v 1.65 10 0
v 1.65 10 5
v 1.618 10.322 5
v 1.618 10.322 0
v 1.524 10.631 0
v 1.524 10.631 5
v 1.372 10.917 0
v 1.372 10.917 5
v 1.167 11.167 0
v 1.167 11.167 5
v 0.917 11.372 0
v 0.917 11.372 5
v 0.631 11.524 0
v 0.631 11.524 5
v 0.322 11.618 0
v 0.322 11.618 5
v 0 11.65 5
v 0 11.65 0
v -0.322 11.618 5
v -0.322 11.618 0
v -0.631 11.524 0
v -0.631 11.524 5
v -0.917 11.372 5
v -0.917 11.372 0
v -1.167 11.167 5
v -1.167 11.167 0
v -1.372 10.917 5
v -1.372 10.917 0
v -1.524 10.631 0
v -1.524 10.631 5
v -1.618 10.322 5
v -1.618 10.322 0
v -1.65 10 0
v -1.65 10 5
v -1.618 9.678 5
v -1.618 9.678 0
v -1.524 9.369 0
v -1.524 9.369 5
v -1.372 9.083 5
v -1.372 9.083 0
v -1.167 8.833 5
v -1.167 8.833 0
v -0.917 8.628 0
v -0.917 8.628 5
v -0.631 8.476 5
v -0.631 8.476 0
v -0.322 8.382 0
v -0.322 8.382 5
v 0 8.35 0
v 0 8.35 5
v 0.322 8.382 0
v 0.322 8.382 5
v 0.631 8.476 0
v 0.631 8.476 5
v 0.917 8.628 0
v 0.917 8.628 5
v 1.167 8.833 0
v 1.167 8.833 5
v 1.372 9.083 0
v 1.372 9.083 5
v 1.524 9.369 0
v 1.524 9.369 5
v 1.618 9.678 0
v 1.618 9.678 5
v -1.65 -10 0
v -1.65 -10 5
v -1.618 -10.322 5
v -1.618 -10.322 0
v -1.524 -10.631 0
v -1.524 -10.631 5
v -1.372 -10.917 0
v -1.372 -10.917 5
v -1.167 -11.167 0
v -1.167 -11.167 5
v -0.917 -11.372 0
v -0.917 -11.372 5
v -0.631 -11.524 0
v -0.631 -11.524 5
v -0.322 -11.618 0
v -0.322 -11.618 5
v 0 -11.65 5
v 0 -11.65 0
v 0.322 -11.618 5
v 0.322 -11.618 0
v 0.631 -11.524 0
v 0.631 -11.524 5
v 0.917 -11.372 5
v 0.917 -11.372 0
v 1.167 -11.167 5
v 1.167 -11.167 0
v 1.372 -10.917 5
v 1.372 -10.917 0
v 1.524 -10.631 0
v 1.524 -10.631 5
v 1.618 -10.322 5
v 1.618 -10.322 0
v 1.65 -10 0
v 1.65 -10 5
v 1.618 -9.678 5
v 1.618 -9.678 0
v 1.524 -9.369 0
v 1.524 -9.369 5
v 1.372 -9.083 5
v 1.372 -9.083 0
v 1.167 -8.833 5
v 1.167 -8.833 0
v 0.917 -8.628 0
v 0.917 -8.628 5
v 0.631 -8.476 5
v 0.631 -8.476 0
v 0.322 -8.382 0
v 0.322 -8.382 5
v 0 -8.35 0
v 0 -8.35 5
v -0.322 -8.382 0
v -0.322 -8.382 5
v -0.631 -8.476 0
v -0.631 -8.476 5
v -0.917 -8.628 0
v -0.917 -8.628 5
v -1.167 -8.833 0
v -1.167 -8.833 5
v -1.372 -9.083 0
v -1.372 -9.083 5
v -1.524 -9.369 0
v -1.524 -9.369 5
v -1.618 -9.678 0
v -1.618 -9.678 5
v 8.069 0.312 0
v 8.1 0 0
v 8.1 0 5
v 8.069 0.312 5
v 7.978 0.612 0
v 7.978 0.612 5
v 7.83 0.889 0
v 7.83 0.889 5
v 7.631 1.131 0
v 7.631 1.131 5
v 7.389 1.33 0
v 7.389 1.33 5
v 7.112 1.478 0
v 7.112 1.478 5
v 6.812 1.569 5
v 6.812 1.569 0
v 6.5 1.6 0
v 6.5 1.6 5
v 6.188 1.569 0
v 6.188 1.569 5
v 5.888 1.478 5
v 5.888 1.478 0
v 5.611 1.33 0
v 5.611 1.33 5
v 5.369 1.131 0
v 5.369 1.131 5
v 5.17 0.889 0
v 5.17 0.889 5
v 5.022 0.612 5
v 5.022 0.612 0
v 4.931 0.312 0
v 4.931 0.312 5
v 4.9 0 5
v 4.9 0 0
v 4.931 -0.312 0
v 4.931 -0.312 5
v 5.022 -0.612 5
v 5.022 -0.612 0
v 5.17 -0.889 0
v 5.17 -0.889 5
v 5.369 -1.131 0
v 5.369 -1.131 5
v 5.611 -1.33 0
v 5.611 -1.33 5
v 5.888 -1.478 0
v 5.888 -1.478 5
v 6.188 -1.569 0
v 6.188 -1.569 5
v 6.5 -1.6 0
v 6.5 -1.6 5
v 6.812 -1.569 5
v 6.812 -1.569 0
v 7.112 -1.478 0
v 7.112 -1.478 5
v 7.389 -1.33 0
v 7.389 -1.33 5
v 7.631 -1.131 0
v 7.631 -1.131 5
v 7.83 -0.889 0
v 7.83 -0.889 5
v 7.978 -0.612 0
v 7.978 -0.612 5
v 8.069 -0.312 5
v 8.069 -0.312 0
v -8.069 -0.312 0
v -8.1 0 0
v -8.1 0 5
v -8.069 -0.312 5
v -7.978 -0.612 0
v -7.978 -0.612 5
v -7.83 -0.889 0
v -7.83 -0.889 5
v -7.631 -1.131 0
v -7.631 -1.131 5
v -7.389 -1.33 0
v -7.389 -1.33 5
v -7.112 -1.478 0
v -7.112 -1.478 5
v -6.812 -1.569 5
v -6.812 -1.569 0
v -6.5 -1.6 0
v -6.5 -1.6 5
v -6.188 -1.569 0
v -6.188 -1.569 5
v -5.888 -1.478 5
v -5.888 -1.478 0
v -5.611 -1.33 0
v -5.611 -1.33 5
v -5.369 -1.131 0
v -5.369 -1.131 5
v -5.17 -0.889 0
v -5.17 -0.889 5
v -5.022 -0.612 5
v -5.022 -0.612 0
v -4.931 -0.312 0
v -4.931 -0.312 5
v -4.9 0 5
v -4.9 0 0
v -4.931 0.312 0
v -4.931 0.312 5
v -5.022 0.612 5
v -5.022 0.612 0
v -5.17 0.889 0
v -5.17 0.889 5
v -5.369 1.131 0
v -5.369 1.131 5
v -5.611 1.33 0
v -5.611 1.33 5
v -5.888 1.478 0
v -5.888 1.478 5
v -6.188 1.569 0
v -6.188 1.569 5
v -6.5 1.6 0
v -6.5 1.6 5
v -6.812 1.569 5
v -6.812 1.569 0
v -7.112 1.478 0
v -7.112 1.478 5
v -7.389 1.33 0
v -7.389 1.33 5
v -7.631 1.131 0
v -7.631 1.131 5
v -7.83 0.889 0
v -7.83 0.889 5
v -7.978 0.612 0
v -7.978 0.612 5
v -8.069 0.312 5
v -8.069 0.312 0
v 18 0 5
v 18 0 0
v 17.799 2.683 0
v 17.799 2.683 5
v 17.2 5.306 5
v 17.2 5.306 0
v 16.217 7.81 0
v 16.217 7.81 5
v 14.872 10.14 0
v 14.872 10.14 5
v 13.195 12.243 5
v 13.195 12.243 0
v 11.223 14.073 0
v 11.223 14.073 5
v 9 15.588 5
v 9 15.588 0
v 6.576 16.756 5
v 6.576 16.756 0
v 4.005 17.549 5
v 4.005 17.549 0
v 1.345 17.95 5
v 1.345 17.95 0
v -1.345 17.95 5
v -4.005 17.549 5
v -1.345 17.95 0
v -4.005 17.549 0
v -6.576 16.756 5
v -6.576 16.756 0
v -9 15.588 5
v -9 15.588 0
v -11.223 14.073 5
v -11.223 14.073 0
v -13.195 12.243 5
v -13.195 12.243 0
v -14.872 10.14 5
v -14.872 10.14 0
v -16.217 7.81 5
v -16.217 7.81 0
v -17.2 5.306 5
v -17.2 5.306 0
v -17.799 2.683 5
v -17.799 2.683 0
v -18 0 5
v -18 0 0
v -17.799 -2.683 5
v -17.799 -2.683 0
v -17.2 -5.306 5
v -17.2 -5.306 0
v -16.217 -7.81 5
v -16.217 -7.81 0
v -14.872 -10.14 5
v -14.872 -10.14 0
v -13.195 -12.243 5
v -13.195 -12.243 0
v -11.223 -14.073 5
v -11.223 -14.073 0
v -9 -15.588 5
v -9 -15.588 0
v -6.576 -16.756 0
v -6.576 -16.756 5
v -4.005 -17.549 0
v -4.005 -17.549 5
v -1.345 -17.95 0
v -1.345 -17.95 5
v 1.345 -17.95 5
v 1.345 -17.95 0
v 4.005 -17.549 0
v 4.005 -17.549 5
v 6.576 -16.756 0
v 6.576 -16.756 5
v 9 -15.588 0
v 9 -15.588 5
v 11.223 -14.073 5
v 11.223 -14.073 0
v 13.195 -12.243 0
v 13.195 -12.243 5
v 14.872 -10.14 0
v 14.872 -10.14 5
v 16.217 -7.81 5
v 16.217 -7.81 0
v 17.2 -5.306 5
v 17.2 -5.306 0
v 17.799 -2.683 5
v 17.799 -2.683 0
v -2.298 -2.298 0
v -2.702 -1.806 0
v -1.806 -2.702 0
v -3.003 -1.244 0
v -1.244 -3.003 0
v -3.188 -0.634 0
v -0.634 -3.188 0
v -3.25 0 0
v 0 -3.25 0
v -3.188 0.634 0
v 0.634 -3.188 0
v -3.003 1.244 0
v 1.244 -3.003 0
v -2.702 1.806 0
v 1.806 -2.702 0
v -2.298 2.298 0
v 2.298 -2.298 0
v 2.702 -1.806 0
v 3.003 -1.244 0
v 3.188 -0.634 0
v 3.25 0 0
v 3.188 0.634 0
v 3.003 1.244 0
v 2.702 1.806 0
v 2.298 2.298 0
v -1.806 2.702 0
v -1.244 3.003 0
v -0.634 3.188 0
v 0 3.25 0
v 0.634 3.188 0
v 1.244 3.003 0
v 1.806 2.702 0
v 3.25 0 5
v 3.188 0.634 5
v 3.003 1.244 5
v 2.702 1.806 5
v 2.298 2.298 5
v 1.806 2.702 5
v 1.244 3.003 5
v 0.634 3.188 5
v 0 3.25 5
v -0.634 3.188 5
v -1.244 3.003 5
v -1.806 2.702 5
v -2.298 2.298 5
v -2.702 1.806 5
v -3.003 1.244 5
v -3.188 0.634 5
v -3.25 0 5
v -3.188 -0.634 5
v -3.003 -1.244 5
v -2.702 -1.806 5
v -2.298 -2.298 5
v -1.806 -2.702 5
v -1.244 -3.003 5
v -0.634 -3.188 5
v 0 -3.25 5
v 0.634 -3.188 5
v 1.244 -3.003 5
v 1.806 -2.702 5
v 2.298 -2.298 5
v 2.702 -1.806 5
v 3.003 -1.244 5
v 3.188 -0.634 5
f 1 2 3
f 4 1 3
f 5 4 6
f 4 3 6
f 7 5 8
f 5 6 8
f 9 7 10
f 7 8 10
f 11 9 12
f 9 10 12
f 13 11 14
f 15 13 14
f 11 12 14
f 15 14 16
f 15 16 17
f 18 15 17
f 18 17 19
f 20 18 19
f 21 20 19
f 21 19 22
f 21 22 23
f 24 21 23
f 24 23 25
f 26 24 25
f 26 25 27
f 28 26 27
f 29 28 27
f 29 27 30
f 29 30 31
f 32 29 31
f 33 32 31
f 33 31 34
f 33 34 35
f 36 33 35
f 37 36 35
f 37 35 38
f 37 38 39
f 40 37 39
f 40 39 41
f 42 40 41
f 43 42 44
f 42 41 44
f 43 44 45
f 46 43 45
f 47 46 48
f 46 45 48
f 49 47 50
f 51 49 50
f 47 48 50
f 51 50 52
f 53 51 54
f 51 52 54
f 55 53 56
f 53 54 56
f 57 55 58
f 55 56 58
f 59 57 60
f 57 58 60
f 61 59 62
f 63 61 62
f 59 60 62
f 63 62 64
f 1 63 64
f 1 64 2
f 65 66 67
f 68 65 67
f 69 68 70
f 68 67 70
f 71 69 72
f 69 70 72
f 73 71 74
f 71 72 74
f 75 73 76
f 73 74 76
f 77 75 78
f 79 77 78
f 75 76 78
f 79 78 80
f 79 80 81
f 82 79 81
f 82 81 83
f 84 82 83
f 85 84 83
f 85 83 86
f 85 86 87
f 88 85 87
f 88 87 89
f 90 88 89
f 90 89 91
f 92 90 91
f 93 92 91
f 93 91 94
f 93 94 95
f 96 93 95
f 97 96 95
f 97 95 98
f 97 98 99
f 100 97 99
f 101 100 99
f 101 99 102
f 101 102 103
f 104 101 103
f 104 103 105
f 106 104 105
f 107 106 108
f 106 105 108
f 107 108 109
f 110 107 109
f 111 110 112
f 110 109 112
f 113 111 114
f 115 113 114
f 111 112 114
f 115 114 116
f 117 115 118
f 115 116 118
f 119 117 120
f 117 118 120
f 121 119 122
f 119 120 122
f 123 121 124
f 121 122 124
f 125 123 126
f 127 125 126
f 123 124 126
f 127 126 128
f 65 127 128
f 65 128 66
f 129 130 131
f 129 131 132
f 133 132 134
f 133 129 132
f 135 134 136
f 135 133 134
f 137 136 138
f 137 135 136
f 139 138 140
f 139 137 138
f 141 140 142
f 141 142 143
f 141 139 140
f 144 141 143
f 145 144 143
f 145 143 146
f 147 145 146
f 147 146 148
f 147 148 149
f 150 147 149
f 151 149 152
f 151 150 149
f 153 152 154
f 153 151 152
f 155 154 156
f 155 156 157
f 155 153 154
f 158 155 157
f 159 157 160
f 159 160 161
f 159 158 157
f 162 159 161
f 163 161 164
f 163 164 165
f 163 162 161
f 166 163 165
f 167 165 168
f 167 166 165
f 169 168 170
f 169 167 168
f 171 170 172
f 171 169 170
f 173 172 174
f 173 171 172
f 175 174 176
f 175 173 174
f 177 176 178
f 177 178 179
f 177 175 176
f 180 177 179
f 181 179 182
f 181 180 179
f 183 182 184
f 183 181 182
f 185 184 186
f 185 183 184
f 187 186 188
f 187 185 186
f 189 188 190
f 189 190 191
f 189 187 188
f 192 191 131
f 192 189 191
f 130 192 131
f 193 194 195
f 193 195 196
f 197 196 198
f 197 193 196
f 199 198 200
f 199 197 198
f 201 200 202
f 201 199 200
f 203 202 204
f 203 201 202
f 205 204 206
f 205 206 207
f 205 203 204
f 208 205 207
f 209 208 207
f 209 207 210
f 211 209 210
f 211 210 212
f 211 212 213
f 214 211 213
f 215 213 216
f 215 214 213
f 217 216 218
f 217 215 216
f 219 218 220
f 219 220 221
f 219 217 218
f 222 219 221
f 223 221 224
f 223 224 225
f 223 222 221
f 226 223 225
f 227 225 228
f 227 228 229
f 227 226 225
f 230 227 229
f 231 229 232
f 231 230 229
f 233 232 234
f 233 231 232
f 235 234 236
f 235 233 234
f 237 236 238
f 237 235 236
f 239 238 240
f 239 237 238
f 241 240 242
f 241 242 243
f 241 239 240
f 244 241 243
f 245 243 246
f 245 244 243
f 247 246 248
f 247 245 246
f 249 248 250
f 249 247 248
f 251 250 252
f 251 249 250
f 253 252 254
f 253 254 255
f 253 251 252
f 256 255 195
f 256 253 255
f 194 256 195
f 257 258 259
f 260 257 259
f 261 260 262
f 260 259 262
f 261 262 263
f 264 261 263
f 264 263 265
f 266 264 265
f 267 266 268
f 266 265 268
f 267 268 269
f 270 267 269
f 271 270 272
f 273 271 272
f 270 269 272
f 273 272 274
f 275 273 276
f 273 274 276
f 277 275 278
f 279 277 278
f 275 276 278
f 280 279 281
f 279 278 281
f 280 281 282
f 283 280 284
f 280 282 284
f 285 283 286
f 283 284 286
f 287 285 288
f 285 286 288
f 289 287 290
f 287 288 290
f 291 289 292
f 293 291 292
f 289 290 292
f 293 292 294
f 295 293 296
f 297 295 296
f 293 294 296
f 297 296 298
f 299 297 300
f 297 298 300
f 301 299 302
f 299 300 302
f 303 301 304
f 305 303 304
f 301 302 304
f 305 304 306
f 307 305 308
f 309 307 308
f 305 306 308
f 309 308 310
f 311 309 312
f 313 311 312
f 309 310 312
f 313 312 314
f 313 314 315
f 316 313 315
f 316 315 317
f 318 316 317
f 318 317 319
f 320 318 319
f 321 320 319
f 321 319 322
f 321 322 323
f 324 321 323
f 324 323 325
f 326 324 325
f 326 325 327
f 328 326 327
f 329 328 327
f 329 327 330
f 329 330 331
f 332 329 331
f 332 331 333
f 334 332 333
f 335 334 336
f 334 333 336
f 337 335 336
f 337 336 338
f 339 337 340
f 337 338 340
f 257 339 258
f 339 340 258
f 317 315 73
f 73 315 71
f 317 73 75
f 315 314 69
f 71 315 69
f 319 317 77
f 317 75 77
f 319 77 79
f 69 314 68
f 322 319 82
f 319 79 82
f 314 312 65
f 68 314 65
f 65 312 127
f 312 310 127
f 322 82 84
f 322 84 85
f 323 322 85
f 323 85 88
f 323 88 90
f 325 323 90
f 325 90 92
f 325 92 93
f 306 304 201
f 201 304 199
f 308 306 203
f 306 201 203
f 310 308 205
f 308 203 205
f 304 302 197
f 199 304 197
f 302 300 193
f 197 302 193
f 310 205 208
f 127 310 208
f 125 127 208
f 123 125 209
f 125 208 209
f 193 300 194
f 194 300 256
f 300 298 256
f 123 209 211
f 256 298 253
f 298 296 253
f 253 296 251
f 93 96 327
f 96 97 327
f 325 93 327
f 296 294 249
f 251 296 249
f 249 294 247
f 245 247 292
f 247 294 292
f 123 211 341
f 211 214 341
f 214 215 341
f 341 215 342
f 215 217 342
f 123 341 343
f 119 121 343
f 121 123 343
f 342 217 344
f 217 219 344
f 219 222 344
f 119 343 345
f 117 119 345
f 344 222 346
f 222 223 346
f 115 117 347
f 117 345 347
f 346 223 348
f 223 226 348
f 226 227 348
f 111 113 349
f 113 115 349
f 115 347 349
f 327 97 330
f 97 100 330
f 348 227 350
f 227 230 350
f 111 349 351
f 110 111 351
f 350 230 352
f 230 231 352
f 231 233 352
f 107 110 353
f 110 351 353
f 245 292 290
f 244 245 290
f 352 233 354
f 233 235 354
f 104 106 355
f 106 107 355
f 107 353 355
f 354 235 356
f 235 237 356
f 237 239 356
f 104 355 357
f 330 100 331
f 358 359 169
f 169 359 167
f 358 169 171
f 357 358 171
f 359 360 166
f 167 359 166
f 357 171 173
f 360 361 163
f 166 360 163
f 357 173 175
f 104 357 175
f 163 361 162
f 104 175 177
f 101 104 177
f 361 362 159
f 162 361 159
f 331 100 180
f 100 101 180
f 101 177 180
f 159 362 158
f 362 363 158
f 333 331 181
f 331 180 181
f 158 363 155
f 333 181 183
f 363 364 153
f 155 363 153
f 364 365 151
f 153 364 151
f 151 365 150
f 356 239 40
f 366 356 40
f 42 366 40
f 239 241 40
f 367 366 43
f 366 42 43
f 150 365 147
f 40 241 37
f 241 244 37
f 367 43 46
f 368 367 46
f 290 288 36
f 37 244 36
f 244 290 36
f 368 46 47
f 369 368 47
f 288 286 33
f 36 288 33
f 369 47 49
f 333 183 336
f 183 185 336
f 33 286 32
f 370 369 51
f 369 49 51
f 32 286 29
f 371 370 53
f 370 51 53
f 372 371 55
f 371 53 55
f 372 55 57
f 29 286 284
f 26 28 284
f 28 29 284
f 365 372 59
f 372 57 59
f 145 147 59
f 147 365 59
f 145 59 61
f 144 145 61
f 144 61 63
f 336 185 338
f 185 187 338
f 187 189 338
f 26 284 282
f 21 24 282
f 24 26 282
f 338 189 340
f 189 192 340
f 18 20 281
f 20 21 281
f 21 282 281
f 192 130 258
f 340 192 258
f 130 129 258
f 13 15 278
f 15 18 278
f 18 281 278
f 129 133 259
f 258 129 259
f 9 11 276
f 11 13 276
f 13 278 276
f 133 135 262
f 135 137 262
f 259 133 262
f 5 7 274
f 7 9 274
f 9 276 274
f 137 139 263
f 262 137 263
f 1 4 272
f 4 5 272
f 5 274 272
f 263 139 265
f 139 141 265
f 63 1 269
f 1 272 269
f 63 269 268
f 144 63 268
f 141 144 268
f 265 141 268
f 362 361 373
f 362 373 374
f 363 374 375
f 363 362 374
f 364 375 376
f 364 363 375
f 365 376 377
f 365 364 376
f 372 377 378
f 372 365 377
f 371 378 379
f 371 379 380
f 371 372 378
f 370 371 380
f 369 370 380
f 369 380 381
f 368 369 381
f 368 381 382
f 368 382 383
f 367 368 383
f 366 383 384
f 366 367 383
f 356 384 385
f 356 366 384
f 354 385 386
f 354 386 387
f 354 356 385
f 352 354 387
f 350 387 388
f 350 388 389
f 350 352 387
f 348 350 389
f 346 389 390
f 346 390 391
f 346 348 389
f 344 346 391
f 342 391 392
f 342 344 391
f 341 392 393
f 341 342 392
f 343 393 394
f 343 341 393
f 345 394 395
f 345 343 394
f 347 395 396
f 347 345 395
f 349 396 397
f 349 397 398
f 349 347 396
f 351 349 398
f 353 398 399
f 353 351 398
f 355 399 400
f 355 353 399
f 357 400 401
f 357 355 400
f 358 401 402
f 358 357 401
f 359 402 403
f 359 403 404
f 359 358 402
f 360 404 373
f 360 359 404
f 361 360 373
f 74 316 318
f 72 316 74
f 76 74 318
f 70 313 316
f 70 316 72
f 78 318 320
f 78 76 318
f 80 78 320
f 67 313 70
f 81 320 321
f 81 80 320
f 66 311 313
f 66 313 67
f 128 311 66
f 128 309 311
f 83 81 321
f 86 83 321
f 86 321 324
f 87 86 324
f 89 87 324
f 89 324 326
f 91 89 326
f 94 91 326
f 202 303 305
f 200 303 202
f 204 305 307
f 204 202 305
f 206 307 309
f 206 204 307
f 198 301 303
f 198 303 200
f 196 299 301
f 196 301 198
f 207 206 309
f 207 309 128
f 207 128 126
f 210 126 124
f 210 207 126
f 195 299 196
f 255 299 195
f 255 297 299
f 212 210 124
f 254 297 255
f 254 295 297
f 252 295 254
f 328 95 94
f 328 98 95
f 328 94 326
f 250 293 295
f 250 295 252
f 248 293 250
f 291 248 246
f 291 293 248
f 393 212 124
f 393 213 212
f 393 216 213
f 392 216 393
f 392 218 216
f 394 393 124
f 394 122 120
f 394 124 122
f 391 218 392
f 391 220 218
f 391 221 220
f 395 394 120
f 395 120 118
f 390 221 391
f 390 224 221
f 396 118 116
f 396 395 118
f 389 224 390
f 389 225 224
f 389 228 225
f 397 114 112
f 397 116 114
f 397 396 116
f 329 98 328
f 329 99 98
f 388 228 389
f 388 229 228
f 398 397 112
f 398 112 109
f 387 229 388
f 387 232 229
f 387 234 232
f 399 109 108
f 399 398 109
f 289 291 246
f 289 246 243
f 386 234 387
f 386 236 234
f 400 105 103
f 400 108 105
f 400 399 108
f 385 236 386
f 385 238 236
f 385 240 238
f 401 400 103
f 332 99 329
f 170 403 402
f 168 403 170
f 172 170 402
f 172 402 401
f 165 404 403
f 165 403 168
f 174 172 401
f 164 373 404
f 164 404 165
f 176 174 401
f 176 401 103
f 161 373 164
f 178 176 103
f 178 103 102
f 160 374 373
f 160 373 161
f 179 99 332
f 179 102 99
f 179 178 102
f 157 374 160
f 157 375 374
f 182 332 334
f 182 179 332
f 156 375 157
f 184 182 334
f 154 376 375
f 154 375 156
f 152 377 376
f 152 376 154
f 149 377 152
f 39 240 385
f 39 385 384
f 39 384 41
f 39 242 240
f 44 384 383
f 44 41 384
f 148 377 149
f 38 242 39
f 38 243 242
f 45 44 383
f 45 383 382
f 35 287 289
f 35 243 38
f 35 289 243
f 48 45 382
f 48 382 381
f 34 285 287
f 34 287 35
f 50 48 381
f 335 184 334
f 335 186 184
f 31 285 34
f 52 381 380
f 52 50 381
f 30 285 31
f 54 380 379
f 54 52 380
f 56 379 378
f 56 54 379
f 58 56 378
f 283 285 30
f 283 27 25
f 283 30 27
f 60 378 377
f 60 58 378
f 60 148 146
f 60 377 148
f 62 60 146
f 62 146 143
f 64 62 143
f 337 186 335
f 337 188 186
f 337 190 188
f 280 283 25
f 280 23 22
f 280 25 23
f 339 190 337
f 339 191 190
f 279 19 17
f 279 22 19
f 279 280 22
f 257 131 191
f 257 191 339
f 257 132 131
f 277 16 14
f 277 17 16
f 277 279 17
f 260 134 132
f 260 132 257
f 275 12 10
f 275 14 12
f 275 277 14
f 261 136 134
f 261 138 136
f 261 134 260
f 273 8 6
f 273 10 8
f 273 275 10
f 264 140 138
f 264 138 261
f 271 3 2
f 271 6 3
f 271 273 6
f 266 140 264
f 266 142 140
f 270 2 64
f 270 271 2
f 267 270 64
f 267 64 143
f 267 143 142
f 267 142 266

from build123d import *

# Parameters (mm, degrees)
SKETCH_1_R          = 18
SKETCH_1_R_2        = 3.25
SKETCH_1_R_3        = 1.6
EXTRUDE_1_DEPTH     = 5
SKETCH_2_R          = 1.65
CUT_EXTRUDE_1_DEPTH = 26.942243542


with BuildPart() as part:
    # ｽｹｯﾁ1 → ﾎﾞｽ - 押し出し1 (new body)
    with BuildSketch(Plane.XY):
        Circle(SKETCH_1_R)
        Circle(SKETCH_1_R_2, mode=Mode.SUBTRACT)
        with Locations((6.5, 0)):
            Circle(SKETCH_1_R_3, mode=Mode.SUBTRACT)
        with Locations(Location((-6.5, 0, 0), (0, 0, 180))):
            Circle(SKETCH_1_R_3, mode=Mode.SUBTRACT)
    extrude(amount=EXTRUDE_1_DEPTH)

    # ｽｹｯﾁ2 → ｶｯﾄ - 押し出し1 (cut, through all)
    with BuildSketch(Plane.XY.offset(5)):
        with Locations((0, 10)):
            Circle(SKETCH_2_R)
        with Locations(Location((0, -10, 0), (0, 0, 180))):
            Circle(SKETCH_2_R)
    extrude(amount=-CUT_EXTRUDE_1_DEPTH, mode=Mode.SUBTRACT)


solid = part.part
